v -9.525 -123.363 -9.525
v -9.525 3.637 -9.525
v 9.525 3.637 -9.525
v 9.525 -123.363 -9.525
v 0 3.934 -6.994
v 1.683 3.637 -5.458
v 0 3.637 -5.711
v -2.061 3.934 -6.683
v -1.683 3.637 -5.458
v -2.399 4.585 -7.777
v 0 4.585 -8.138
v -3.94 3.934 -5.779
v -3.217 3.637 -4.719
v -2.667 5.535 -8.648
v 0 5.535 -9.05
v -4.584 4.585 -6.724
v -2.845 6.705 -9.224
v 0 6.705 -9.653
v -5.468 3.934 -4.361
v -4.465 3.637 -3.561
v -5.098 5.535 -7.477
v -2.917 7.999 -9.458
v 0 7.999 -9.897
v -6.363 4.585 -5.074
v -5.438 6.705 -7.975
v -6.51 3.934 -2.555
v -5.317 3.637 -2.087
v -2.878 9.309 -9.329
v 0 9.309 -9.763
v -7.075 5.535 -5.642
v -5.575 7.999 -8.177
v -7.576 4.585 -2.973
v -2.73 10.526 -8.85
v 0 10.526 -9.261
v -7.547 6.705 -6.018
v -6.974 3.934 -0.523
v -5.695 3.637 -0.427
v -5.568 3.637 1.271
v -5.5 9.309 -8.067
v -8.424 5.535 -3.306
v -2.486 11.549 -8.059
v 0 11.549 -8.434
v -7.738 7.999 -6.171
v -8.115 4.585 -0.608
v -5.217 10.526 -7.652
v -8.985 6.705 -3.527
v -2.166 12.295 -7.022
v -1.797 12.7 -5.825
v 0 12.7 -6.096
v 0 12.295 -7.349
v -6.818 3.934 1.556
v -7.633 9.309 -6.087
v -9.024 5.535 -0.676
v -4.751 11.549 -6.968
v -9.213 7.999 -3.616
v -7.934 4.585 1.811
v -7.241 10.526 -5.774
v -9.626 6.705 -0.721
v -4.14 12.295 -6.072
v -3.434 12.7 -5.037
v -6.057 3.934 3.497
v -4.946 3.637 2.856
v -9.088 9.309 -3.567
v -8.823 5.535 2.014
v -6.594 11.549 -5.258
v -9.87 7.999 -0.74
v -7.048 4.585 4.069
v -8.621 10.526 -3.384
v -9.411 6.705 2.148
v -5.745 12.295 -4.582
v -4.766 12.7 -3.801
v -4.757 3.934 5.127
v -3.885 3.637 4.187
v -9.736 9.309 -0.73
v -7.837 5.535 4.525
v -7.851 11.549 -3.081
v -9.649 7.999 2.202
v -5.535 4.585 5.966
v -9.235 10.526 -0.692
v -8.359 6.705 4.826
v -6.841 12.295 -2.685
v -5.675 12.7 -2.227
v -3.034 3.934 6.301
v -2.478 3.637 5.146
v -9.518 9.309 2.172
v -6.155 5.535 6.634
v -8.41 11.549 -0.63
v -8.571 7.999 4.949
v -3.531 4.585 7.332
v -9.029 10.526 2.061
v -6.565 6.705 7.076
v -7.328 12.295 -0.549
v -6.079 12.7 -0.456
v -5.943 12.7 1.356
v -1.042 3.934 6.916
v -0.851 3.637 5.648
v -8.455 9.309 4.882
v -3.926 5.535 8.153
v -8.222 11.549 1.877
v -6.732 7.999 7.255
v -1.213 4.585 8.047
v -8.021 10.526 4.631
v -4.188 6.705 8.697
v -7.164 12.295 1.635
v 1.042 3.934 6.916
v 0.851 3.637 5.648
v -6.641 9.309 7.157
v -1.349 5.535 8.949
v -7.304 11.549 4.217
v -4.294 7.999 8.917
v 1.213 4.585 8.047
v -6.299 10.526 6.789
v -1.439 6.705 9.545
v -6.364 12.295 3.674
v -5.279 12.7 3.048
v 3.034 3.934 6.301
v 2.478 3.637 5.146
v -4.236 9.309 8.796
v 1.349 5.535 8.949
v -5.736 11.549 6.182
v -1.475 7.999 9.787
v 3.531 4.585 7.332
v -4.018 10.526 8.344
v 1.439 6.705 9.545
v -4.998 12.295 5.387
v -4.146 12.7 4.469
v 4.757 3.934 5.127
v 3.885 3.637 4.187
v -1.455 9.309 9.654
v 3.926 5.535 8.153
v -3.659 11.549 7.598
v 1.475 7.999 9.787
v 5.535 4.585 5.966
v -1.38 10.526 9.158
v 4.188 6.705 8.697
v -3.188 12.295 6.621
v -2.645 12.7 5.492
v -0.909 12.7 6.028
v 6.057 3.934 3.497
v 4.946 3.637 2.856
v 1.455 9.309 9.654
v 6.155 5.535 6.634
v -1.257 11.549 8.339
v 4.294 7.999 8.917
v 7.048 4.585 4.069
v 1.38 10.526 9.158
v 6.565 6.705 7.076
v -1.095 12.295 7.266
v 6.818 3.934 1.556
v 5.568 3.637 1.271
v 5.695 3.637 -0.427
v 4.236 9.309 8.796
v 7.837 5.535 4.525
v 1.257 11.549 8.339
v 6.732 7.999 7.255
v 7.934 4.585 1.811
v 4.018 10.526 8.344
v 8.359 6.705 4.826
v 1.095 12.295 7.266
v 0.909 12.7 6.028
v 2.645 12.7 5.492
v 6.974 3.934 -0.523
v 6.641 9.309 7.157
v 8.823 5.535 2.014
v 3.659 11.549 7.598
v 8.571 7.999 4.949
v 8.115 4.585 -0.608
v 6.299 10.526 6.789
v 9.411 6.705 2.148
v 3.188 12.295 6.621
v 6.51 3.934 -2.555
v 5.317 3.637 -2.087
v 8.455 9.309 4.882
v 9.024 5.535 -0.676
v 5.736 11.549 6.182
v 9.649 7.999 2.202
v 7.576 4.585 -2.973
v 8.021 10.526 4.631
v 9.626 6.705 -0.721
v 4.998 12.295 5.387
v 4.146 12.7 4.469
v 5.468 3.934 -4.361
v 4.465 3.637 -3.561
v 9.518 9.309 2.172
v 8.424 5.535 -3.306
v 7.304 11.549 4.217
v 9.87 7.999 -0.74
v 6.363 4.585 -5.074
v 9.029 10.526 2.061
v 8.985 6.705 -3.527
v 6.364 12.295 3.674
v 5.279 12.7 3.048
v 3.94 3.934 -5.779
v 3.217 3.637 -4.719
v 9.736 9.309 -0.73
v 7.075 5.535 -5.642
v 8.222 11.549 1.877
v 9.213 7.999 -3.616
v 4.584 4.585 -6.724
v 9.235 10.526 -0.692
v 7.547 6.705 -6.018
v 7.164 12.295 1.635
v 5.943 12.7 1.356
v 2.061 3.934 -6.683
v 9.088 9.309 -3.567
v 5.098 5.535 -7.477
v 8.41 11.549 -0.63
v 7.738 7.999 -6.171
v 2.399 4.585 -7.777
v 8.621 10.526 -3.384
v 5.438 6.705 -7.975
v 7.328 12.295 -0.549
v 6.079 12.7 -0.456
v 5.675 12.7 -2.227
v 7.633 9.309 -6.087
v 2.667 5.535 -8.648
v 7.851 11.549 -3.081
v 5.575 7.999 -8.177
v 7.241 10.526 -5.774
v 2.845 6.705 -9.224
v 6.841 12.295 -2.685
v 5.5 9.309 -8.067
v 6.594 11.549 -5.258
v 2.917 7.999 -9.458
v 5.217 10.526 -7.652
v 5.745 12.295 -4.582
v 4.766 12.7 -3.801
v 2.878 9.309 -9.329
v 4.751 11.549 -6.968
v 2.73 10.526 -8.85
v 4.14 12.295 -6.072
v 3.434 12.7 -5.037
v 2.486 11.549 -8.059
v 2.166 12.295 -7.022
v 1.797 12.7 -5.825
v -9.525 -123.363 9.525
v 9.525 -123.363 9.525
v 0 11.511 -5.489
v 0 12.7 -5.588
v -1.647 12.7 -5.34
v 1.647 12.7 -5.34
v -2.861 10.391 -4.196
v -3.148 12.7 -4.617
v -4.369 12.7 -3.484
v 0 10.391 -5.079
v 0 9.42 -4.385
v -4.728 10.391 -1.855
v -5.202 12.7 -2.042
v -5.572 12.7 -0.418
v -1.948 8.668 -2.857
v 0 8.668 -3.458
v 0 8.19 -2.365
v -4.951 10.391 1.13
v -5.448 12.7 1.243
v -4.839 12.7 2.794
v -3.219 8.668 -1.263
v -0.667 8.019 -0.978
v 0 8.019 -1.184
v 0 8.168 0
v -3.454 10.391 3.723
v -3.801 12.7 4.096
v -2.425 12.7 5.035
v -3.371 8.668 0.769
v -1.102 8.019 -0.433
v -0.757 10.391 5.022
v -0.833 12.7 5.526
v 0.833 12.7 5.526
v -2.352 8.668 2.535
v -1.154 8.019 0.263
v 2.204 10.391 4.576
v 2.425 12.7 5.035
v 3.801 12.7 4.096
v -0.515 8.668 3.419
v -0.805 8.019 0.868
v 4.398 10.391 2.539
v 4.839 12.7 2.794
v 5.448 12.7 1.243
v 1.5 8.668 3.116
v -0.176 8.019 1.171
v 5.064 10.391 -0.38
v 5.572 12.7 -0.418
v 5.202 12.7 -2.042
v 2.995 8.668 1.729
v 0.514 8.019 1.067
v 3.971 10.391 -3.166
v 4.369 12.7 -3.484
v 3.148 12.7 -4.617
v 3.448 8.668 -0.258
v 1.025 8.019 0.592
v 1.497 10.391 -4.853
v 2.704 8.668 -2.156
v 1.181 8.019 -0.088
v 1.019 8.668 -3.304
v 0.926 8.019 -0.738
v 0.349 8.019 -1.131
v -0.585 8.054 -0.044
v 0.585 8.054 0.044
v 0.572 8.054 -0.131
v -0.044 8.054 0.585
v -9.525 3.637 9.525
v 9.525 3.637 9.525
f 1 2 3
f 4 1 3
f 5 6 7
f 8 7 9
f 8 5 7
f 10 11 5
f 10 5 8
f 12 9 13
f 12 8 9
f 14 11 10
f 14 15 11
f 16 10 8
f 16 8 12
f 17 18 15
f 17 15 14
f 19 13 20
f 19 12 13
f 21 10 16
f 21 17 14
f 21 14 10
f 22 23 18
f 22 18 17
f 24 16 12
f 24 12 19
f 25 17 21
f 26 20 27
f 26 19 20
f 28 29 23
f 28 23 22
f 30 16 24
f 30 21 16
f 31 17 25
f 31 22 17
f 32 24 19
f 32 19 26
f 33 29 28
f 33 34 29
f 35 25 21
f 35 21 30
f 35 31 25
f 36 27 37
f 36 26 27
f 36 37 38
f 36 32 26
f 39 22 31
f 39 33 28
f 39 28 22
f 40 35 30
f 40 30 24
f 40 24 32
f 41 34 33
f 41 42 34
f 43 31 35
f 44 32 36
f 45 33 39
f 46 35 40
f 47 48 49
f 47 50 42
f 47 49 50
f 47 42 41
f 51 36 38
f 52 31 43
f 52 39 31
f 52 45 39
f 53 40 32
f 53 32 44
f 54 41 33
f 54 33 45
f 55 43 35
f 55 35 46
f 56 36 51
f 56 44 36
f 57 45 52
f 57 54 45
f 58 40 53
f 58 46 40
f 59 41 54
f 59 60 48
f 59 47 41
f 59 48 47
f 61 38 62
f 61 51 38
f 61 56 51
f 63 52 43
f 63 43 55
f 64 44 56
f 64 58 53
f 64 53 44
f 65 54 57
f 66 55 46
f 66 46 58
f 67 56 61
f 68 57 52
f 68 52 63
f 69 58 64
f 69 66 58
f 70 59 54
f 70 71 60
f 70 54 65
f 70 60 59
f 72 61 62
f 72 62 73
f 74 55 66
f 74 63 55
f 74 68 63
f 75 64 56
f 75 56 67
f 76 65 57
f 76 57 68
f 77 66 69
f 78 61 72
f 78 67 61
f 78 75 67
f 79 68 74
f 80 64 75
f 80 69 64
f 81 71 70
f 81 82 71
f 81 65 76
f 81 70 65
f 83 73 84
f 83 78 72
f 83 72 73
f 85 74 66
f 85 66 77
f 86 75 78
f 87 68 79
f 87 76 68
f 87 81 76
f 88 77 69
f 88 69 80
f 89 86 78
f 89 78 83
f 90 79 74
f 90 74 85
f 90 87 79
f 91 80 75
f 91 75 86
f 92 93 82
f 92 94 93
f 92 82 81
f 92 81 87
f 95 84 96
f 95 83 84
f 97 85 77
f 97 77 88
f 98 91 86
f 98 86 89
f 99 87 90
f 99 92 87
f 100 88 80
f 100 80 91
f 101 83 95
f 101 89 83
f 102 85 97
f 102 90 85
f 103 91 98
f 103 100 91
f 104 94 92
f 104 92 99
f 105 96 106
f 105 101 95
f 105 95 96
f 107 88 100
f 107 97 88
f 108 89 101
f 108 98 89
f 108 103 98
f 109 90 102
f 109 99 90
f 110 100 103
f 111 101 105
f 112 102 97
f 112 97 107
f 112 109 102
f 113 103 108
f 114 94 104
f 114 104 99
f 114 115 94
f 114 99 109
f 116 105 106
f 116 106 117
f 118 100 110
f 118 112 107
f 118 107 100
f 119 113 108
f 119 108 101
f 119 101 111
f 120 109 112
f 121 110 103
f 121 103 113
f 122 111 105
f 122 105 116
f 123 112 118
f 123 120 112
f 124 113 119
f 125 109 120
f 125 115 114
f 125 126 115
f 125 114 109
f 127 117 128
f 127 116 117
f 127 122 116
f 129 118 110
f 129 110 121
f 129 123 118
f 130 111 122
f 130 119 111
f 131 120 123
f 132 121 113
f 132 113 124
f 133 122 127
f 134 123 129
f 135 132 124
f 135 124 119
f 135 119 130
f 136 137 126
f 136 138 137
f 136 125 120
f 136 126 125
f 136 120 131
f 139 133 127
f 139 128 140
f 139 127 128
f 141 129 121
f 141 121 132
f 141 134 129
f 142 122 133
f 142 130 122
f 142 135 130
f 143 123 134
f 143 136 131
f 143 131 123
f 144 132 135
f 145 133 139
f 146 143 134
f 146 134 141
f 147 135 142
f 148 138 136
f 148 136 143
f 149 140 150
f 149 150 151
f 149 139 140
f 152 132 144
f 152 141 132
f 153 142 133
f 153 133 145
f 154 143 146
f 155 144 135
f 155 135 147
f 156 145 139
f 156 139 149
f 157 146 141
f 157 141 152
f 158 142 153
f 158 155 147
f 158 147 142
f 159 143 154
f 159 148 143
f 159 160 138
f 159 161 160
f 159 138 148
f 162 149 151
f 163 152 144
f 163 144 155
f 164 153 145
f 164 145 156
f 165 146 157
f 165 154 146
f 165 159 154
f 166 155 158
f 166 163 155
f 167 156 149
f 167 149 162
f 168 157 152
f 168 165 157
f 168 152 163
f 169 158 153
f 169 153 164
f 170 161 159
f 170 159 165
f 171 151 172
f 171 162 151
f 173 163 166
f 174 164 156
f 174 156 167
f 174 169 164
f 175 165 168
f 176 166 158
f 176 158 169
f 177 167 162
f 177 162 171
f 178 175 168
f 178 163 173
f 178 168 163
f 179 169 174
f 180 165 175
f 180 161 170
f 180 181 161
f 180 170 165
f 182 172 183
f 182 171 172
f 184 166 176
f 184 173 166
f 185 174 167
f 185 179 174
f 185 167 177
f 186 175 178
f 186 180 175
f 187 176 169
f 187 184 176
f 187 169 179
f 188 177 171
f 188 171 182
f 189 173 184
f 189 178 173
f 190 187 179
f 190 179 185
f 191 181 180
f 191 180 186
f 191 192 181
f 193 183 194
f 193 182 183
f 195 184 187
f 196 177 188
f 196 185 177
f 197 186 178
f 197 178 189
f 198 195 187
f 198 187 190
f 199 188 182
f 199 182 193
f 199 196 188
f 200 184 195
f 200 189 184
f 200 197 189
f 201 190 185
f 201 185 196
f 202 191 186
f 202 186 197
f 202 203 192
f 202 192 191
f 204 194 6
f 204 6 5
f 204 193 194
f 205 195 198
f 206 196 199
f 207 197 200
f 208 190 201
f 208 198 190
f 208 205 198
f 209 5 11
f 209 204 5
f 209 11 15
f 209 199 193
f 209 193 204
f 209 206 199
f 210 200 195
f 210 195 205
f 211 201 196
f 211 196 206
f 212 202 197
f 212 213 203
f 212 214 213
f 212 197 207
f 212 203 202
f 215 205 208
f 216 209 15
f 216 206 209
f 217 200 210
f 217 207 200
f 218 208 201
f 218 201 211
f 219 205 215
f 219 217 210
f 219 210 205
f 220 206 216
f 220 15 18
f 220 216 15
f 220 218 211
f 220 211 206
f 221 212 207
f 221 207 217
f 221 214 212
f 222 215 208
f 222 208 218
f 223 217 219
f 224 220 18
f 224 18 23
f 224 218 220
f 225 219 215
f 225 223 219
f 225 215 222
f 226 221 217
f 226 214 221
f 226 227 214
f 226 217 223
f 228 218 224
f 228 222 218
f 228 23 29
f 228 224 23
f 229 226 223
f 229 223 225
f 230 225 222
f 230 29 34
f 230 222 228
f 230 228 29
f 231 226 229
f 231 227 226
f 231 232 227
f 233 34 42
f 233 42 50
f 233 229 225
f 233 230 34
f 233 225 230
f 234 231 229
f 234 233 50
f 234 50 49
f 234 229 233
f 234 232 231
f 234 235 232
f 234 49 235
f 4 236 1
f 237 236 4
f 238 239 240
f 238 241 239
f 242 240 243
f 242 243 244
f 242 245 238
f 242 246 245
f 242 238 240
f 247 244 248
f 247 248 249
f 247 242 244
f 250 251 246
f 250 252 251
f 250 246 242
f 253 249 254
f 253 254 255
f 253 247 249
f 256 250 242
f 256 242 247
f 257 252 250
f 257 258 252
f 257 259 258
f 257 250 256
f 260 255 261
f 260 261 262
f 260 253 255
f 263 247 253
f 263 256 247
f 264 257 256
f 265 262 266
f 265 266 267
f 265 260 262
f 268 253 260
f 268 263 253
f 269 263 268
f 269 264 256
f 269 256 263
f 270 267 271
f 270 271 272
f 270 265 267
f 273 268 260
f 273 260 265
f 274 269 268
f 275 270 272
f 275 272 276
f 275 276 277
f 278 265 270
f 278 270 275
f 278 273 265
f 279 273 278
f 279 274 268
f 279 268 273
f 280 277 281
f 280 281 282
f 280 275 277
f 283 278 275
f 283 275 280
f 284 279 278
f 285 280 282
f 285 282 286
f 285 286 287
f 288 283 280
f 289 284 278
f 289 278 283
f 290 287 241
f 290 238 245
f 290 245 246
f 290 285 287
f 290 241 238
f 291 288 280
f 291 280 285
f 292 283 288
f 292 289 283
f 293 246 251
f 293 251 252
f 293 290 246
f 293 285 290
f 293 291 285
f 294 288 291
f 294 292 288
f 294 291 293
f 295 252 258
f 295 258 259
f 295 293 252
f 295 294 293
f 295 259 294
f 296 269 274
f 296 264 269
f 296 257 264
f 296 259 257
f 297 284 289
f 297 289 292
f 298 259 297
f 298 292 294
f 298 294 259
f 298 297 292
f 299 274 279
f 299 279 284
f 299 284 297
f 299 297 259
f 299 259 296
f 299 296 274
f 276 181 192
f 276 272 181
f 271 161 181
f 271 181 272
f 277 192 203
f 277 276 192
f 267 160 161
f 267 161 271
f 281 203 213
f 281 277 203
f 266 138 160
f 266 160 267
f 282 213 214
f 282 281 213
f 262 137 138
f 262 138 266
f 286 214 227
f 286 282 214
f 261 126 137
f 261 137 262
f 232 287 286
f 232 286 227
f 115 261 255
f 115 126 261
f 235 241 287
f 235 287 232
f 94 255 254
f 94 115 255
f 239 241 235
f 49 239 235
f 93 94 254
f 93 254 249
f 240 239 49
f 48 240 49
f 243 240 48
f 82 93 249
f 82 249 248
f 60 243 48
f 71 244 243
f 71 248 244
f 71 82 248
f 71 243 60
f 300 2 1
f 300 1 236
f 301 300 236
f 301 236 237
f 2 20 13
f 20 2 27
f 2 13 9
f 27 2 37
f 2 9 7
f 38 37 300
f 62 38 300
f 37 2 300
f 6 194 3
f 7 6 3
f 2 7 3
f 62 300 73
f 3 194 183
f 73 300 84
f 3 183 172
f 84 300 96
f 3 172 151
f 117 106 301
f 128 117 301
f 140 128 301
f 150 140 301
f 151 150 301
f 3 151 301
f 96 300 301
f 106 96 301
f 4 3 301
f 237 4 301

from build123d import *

# Parameters (mm, degrees)
SKETCH4_W           = 19.05
SKETCH4_H           = 19.05
BOSS_EXTRUDE1_DEPTH = 127


with BuildPart() as part:
    # Sketch2 → Revolve2 (revolve)
    with BuildSketch(Plane.XY, mode=Mode.PRIVATE) as revolve2_sk:
        with BuildLine():
            Line((0, 8.168367528), (0, 3.636735056))
            Line((0, 3.636735056), (4.947214611, 3.636735056))
            ThreePointArc((4.947214611, 3.636735056), (9.865040683, 7.617829413), (6.096, 12.7))
            Line((6.096, 12.7), (5.588, 12.7))
            ThreePointArc((5.588, 12.7), (3.946698626, 9.012779896), (0, 8.168367528))
        make_face()
    revolve(revolve2_sk.sketch.rotate(Axis((0, 3.636735056, 0), (0, 1, 0)), 90), axis=Axis((0, 3.636735056, 0), (0, 1, 0)))

    # Sketch4 → Boss-Extrude1 (add)
    with BuildSketch(Plane.XZ.offset(-3.636735056)):
        Rectangle(SKETCH4_W, SKETCH4_H)
    extrude(amount=BOSS_EXTRUDE1_DEPTH)


solid = part.part
